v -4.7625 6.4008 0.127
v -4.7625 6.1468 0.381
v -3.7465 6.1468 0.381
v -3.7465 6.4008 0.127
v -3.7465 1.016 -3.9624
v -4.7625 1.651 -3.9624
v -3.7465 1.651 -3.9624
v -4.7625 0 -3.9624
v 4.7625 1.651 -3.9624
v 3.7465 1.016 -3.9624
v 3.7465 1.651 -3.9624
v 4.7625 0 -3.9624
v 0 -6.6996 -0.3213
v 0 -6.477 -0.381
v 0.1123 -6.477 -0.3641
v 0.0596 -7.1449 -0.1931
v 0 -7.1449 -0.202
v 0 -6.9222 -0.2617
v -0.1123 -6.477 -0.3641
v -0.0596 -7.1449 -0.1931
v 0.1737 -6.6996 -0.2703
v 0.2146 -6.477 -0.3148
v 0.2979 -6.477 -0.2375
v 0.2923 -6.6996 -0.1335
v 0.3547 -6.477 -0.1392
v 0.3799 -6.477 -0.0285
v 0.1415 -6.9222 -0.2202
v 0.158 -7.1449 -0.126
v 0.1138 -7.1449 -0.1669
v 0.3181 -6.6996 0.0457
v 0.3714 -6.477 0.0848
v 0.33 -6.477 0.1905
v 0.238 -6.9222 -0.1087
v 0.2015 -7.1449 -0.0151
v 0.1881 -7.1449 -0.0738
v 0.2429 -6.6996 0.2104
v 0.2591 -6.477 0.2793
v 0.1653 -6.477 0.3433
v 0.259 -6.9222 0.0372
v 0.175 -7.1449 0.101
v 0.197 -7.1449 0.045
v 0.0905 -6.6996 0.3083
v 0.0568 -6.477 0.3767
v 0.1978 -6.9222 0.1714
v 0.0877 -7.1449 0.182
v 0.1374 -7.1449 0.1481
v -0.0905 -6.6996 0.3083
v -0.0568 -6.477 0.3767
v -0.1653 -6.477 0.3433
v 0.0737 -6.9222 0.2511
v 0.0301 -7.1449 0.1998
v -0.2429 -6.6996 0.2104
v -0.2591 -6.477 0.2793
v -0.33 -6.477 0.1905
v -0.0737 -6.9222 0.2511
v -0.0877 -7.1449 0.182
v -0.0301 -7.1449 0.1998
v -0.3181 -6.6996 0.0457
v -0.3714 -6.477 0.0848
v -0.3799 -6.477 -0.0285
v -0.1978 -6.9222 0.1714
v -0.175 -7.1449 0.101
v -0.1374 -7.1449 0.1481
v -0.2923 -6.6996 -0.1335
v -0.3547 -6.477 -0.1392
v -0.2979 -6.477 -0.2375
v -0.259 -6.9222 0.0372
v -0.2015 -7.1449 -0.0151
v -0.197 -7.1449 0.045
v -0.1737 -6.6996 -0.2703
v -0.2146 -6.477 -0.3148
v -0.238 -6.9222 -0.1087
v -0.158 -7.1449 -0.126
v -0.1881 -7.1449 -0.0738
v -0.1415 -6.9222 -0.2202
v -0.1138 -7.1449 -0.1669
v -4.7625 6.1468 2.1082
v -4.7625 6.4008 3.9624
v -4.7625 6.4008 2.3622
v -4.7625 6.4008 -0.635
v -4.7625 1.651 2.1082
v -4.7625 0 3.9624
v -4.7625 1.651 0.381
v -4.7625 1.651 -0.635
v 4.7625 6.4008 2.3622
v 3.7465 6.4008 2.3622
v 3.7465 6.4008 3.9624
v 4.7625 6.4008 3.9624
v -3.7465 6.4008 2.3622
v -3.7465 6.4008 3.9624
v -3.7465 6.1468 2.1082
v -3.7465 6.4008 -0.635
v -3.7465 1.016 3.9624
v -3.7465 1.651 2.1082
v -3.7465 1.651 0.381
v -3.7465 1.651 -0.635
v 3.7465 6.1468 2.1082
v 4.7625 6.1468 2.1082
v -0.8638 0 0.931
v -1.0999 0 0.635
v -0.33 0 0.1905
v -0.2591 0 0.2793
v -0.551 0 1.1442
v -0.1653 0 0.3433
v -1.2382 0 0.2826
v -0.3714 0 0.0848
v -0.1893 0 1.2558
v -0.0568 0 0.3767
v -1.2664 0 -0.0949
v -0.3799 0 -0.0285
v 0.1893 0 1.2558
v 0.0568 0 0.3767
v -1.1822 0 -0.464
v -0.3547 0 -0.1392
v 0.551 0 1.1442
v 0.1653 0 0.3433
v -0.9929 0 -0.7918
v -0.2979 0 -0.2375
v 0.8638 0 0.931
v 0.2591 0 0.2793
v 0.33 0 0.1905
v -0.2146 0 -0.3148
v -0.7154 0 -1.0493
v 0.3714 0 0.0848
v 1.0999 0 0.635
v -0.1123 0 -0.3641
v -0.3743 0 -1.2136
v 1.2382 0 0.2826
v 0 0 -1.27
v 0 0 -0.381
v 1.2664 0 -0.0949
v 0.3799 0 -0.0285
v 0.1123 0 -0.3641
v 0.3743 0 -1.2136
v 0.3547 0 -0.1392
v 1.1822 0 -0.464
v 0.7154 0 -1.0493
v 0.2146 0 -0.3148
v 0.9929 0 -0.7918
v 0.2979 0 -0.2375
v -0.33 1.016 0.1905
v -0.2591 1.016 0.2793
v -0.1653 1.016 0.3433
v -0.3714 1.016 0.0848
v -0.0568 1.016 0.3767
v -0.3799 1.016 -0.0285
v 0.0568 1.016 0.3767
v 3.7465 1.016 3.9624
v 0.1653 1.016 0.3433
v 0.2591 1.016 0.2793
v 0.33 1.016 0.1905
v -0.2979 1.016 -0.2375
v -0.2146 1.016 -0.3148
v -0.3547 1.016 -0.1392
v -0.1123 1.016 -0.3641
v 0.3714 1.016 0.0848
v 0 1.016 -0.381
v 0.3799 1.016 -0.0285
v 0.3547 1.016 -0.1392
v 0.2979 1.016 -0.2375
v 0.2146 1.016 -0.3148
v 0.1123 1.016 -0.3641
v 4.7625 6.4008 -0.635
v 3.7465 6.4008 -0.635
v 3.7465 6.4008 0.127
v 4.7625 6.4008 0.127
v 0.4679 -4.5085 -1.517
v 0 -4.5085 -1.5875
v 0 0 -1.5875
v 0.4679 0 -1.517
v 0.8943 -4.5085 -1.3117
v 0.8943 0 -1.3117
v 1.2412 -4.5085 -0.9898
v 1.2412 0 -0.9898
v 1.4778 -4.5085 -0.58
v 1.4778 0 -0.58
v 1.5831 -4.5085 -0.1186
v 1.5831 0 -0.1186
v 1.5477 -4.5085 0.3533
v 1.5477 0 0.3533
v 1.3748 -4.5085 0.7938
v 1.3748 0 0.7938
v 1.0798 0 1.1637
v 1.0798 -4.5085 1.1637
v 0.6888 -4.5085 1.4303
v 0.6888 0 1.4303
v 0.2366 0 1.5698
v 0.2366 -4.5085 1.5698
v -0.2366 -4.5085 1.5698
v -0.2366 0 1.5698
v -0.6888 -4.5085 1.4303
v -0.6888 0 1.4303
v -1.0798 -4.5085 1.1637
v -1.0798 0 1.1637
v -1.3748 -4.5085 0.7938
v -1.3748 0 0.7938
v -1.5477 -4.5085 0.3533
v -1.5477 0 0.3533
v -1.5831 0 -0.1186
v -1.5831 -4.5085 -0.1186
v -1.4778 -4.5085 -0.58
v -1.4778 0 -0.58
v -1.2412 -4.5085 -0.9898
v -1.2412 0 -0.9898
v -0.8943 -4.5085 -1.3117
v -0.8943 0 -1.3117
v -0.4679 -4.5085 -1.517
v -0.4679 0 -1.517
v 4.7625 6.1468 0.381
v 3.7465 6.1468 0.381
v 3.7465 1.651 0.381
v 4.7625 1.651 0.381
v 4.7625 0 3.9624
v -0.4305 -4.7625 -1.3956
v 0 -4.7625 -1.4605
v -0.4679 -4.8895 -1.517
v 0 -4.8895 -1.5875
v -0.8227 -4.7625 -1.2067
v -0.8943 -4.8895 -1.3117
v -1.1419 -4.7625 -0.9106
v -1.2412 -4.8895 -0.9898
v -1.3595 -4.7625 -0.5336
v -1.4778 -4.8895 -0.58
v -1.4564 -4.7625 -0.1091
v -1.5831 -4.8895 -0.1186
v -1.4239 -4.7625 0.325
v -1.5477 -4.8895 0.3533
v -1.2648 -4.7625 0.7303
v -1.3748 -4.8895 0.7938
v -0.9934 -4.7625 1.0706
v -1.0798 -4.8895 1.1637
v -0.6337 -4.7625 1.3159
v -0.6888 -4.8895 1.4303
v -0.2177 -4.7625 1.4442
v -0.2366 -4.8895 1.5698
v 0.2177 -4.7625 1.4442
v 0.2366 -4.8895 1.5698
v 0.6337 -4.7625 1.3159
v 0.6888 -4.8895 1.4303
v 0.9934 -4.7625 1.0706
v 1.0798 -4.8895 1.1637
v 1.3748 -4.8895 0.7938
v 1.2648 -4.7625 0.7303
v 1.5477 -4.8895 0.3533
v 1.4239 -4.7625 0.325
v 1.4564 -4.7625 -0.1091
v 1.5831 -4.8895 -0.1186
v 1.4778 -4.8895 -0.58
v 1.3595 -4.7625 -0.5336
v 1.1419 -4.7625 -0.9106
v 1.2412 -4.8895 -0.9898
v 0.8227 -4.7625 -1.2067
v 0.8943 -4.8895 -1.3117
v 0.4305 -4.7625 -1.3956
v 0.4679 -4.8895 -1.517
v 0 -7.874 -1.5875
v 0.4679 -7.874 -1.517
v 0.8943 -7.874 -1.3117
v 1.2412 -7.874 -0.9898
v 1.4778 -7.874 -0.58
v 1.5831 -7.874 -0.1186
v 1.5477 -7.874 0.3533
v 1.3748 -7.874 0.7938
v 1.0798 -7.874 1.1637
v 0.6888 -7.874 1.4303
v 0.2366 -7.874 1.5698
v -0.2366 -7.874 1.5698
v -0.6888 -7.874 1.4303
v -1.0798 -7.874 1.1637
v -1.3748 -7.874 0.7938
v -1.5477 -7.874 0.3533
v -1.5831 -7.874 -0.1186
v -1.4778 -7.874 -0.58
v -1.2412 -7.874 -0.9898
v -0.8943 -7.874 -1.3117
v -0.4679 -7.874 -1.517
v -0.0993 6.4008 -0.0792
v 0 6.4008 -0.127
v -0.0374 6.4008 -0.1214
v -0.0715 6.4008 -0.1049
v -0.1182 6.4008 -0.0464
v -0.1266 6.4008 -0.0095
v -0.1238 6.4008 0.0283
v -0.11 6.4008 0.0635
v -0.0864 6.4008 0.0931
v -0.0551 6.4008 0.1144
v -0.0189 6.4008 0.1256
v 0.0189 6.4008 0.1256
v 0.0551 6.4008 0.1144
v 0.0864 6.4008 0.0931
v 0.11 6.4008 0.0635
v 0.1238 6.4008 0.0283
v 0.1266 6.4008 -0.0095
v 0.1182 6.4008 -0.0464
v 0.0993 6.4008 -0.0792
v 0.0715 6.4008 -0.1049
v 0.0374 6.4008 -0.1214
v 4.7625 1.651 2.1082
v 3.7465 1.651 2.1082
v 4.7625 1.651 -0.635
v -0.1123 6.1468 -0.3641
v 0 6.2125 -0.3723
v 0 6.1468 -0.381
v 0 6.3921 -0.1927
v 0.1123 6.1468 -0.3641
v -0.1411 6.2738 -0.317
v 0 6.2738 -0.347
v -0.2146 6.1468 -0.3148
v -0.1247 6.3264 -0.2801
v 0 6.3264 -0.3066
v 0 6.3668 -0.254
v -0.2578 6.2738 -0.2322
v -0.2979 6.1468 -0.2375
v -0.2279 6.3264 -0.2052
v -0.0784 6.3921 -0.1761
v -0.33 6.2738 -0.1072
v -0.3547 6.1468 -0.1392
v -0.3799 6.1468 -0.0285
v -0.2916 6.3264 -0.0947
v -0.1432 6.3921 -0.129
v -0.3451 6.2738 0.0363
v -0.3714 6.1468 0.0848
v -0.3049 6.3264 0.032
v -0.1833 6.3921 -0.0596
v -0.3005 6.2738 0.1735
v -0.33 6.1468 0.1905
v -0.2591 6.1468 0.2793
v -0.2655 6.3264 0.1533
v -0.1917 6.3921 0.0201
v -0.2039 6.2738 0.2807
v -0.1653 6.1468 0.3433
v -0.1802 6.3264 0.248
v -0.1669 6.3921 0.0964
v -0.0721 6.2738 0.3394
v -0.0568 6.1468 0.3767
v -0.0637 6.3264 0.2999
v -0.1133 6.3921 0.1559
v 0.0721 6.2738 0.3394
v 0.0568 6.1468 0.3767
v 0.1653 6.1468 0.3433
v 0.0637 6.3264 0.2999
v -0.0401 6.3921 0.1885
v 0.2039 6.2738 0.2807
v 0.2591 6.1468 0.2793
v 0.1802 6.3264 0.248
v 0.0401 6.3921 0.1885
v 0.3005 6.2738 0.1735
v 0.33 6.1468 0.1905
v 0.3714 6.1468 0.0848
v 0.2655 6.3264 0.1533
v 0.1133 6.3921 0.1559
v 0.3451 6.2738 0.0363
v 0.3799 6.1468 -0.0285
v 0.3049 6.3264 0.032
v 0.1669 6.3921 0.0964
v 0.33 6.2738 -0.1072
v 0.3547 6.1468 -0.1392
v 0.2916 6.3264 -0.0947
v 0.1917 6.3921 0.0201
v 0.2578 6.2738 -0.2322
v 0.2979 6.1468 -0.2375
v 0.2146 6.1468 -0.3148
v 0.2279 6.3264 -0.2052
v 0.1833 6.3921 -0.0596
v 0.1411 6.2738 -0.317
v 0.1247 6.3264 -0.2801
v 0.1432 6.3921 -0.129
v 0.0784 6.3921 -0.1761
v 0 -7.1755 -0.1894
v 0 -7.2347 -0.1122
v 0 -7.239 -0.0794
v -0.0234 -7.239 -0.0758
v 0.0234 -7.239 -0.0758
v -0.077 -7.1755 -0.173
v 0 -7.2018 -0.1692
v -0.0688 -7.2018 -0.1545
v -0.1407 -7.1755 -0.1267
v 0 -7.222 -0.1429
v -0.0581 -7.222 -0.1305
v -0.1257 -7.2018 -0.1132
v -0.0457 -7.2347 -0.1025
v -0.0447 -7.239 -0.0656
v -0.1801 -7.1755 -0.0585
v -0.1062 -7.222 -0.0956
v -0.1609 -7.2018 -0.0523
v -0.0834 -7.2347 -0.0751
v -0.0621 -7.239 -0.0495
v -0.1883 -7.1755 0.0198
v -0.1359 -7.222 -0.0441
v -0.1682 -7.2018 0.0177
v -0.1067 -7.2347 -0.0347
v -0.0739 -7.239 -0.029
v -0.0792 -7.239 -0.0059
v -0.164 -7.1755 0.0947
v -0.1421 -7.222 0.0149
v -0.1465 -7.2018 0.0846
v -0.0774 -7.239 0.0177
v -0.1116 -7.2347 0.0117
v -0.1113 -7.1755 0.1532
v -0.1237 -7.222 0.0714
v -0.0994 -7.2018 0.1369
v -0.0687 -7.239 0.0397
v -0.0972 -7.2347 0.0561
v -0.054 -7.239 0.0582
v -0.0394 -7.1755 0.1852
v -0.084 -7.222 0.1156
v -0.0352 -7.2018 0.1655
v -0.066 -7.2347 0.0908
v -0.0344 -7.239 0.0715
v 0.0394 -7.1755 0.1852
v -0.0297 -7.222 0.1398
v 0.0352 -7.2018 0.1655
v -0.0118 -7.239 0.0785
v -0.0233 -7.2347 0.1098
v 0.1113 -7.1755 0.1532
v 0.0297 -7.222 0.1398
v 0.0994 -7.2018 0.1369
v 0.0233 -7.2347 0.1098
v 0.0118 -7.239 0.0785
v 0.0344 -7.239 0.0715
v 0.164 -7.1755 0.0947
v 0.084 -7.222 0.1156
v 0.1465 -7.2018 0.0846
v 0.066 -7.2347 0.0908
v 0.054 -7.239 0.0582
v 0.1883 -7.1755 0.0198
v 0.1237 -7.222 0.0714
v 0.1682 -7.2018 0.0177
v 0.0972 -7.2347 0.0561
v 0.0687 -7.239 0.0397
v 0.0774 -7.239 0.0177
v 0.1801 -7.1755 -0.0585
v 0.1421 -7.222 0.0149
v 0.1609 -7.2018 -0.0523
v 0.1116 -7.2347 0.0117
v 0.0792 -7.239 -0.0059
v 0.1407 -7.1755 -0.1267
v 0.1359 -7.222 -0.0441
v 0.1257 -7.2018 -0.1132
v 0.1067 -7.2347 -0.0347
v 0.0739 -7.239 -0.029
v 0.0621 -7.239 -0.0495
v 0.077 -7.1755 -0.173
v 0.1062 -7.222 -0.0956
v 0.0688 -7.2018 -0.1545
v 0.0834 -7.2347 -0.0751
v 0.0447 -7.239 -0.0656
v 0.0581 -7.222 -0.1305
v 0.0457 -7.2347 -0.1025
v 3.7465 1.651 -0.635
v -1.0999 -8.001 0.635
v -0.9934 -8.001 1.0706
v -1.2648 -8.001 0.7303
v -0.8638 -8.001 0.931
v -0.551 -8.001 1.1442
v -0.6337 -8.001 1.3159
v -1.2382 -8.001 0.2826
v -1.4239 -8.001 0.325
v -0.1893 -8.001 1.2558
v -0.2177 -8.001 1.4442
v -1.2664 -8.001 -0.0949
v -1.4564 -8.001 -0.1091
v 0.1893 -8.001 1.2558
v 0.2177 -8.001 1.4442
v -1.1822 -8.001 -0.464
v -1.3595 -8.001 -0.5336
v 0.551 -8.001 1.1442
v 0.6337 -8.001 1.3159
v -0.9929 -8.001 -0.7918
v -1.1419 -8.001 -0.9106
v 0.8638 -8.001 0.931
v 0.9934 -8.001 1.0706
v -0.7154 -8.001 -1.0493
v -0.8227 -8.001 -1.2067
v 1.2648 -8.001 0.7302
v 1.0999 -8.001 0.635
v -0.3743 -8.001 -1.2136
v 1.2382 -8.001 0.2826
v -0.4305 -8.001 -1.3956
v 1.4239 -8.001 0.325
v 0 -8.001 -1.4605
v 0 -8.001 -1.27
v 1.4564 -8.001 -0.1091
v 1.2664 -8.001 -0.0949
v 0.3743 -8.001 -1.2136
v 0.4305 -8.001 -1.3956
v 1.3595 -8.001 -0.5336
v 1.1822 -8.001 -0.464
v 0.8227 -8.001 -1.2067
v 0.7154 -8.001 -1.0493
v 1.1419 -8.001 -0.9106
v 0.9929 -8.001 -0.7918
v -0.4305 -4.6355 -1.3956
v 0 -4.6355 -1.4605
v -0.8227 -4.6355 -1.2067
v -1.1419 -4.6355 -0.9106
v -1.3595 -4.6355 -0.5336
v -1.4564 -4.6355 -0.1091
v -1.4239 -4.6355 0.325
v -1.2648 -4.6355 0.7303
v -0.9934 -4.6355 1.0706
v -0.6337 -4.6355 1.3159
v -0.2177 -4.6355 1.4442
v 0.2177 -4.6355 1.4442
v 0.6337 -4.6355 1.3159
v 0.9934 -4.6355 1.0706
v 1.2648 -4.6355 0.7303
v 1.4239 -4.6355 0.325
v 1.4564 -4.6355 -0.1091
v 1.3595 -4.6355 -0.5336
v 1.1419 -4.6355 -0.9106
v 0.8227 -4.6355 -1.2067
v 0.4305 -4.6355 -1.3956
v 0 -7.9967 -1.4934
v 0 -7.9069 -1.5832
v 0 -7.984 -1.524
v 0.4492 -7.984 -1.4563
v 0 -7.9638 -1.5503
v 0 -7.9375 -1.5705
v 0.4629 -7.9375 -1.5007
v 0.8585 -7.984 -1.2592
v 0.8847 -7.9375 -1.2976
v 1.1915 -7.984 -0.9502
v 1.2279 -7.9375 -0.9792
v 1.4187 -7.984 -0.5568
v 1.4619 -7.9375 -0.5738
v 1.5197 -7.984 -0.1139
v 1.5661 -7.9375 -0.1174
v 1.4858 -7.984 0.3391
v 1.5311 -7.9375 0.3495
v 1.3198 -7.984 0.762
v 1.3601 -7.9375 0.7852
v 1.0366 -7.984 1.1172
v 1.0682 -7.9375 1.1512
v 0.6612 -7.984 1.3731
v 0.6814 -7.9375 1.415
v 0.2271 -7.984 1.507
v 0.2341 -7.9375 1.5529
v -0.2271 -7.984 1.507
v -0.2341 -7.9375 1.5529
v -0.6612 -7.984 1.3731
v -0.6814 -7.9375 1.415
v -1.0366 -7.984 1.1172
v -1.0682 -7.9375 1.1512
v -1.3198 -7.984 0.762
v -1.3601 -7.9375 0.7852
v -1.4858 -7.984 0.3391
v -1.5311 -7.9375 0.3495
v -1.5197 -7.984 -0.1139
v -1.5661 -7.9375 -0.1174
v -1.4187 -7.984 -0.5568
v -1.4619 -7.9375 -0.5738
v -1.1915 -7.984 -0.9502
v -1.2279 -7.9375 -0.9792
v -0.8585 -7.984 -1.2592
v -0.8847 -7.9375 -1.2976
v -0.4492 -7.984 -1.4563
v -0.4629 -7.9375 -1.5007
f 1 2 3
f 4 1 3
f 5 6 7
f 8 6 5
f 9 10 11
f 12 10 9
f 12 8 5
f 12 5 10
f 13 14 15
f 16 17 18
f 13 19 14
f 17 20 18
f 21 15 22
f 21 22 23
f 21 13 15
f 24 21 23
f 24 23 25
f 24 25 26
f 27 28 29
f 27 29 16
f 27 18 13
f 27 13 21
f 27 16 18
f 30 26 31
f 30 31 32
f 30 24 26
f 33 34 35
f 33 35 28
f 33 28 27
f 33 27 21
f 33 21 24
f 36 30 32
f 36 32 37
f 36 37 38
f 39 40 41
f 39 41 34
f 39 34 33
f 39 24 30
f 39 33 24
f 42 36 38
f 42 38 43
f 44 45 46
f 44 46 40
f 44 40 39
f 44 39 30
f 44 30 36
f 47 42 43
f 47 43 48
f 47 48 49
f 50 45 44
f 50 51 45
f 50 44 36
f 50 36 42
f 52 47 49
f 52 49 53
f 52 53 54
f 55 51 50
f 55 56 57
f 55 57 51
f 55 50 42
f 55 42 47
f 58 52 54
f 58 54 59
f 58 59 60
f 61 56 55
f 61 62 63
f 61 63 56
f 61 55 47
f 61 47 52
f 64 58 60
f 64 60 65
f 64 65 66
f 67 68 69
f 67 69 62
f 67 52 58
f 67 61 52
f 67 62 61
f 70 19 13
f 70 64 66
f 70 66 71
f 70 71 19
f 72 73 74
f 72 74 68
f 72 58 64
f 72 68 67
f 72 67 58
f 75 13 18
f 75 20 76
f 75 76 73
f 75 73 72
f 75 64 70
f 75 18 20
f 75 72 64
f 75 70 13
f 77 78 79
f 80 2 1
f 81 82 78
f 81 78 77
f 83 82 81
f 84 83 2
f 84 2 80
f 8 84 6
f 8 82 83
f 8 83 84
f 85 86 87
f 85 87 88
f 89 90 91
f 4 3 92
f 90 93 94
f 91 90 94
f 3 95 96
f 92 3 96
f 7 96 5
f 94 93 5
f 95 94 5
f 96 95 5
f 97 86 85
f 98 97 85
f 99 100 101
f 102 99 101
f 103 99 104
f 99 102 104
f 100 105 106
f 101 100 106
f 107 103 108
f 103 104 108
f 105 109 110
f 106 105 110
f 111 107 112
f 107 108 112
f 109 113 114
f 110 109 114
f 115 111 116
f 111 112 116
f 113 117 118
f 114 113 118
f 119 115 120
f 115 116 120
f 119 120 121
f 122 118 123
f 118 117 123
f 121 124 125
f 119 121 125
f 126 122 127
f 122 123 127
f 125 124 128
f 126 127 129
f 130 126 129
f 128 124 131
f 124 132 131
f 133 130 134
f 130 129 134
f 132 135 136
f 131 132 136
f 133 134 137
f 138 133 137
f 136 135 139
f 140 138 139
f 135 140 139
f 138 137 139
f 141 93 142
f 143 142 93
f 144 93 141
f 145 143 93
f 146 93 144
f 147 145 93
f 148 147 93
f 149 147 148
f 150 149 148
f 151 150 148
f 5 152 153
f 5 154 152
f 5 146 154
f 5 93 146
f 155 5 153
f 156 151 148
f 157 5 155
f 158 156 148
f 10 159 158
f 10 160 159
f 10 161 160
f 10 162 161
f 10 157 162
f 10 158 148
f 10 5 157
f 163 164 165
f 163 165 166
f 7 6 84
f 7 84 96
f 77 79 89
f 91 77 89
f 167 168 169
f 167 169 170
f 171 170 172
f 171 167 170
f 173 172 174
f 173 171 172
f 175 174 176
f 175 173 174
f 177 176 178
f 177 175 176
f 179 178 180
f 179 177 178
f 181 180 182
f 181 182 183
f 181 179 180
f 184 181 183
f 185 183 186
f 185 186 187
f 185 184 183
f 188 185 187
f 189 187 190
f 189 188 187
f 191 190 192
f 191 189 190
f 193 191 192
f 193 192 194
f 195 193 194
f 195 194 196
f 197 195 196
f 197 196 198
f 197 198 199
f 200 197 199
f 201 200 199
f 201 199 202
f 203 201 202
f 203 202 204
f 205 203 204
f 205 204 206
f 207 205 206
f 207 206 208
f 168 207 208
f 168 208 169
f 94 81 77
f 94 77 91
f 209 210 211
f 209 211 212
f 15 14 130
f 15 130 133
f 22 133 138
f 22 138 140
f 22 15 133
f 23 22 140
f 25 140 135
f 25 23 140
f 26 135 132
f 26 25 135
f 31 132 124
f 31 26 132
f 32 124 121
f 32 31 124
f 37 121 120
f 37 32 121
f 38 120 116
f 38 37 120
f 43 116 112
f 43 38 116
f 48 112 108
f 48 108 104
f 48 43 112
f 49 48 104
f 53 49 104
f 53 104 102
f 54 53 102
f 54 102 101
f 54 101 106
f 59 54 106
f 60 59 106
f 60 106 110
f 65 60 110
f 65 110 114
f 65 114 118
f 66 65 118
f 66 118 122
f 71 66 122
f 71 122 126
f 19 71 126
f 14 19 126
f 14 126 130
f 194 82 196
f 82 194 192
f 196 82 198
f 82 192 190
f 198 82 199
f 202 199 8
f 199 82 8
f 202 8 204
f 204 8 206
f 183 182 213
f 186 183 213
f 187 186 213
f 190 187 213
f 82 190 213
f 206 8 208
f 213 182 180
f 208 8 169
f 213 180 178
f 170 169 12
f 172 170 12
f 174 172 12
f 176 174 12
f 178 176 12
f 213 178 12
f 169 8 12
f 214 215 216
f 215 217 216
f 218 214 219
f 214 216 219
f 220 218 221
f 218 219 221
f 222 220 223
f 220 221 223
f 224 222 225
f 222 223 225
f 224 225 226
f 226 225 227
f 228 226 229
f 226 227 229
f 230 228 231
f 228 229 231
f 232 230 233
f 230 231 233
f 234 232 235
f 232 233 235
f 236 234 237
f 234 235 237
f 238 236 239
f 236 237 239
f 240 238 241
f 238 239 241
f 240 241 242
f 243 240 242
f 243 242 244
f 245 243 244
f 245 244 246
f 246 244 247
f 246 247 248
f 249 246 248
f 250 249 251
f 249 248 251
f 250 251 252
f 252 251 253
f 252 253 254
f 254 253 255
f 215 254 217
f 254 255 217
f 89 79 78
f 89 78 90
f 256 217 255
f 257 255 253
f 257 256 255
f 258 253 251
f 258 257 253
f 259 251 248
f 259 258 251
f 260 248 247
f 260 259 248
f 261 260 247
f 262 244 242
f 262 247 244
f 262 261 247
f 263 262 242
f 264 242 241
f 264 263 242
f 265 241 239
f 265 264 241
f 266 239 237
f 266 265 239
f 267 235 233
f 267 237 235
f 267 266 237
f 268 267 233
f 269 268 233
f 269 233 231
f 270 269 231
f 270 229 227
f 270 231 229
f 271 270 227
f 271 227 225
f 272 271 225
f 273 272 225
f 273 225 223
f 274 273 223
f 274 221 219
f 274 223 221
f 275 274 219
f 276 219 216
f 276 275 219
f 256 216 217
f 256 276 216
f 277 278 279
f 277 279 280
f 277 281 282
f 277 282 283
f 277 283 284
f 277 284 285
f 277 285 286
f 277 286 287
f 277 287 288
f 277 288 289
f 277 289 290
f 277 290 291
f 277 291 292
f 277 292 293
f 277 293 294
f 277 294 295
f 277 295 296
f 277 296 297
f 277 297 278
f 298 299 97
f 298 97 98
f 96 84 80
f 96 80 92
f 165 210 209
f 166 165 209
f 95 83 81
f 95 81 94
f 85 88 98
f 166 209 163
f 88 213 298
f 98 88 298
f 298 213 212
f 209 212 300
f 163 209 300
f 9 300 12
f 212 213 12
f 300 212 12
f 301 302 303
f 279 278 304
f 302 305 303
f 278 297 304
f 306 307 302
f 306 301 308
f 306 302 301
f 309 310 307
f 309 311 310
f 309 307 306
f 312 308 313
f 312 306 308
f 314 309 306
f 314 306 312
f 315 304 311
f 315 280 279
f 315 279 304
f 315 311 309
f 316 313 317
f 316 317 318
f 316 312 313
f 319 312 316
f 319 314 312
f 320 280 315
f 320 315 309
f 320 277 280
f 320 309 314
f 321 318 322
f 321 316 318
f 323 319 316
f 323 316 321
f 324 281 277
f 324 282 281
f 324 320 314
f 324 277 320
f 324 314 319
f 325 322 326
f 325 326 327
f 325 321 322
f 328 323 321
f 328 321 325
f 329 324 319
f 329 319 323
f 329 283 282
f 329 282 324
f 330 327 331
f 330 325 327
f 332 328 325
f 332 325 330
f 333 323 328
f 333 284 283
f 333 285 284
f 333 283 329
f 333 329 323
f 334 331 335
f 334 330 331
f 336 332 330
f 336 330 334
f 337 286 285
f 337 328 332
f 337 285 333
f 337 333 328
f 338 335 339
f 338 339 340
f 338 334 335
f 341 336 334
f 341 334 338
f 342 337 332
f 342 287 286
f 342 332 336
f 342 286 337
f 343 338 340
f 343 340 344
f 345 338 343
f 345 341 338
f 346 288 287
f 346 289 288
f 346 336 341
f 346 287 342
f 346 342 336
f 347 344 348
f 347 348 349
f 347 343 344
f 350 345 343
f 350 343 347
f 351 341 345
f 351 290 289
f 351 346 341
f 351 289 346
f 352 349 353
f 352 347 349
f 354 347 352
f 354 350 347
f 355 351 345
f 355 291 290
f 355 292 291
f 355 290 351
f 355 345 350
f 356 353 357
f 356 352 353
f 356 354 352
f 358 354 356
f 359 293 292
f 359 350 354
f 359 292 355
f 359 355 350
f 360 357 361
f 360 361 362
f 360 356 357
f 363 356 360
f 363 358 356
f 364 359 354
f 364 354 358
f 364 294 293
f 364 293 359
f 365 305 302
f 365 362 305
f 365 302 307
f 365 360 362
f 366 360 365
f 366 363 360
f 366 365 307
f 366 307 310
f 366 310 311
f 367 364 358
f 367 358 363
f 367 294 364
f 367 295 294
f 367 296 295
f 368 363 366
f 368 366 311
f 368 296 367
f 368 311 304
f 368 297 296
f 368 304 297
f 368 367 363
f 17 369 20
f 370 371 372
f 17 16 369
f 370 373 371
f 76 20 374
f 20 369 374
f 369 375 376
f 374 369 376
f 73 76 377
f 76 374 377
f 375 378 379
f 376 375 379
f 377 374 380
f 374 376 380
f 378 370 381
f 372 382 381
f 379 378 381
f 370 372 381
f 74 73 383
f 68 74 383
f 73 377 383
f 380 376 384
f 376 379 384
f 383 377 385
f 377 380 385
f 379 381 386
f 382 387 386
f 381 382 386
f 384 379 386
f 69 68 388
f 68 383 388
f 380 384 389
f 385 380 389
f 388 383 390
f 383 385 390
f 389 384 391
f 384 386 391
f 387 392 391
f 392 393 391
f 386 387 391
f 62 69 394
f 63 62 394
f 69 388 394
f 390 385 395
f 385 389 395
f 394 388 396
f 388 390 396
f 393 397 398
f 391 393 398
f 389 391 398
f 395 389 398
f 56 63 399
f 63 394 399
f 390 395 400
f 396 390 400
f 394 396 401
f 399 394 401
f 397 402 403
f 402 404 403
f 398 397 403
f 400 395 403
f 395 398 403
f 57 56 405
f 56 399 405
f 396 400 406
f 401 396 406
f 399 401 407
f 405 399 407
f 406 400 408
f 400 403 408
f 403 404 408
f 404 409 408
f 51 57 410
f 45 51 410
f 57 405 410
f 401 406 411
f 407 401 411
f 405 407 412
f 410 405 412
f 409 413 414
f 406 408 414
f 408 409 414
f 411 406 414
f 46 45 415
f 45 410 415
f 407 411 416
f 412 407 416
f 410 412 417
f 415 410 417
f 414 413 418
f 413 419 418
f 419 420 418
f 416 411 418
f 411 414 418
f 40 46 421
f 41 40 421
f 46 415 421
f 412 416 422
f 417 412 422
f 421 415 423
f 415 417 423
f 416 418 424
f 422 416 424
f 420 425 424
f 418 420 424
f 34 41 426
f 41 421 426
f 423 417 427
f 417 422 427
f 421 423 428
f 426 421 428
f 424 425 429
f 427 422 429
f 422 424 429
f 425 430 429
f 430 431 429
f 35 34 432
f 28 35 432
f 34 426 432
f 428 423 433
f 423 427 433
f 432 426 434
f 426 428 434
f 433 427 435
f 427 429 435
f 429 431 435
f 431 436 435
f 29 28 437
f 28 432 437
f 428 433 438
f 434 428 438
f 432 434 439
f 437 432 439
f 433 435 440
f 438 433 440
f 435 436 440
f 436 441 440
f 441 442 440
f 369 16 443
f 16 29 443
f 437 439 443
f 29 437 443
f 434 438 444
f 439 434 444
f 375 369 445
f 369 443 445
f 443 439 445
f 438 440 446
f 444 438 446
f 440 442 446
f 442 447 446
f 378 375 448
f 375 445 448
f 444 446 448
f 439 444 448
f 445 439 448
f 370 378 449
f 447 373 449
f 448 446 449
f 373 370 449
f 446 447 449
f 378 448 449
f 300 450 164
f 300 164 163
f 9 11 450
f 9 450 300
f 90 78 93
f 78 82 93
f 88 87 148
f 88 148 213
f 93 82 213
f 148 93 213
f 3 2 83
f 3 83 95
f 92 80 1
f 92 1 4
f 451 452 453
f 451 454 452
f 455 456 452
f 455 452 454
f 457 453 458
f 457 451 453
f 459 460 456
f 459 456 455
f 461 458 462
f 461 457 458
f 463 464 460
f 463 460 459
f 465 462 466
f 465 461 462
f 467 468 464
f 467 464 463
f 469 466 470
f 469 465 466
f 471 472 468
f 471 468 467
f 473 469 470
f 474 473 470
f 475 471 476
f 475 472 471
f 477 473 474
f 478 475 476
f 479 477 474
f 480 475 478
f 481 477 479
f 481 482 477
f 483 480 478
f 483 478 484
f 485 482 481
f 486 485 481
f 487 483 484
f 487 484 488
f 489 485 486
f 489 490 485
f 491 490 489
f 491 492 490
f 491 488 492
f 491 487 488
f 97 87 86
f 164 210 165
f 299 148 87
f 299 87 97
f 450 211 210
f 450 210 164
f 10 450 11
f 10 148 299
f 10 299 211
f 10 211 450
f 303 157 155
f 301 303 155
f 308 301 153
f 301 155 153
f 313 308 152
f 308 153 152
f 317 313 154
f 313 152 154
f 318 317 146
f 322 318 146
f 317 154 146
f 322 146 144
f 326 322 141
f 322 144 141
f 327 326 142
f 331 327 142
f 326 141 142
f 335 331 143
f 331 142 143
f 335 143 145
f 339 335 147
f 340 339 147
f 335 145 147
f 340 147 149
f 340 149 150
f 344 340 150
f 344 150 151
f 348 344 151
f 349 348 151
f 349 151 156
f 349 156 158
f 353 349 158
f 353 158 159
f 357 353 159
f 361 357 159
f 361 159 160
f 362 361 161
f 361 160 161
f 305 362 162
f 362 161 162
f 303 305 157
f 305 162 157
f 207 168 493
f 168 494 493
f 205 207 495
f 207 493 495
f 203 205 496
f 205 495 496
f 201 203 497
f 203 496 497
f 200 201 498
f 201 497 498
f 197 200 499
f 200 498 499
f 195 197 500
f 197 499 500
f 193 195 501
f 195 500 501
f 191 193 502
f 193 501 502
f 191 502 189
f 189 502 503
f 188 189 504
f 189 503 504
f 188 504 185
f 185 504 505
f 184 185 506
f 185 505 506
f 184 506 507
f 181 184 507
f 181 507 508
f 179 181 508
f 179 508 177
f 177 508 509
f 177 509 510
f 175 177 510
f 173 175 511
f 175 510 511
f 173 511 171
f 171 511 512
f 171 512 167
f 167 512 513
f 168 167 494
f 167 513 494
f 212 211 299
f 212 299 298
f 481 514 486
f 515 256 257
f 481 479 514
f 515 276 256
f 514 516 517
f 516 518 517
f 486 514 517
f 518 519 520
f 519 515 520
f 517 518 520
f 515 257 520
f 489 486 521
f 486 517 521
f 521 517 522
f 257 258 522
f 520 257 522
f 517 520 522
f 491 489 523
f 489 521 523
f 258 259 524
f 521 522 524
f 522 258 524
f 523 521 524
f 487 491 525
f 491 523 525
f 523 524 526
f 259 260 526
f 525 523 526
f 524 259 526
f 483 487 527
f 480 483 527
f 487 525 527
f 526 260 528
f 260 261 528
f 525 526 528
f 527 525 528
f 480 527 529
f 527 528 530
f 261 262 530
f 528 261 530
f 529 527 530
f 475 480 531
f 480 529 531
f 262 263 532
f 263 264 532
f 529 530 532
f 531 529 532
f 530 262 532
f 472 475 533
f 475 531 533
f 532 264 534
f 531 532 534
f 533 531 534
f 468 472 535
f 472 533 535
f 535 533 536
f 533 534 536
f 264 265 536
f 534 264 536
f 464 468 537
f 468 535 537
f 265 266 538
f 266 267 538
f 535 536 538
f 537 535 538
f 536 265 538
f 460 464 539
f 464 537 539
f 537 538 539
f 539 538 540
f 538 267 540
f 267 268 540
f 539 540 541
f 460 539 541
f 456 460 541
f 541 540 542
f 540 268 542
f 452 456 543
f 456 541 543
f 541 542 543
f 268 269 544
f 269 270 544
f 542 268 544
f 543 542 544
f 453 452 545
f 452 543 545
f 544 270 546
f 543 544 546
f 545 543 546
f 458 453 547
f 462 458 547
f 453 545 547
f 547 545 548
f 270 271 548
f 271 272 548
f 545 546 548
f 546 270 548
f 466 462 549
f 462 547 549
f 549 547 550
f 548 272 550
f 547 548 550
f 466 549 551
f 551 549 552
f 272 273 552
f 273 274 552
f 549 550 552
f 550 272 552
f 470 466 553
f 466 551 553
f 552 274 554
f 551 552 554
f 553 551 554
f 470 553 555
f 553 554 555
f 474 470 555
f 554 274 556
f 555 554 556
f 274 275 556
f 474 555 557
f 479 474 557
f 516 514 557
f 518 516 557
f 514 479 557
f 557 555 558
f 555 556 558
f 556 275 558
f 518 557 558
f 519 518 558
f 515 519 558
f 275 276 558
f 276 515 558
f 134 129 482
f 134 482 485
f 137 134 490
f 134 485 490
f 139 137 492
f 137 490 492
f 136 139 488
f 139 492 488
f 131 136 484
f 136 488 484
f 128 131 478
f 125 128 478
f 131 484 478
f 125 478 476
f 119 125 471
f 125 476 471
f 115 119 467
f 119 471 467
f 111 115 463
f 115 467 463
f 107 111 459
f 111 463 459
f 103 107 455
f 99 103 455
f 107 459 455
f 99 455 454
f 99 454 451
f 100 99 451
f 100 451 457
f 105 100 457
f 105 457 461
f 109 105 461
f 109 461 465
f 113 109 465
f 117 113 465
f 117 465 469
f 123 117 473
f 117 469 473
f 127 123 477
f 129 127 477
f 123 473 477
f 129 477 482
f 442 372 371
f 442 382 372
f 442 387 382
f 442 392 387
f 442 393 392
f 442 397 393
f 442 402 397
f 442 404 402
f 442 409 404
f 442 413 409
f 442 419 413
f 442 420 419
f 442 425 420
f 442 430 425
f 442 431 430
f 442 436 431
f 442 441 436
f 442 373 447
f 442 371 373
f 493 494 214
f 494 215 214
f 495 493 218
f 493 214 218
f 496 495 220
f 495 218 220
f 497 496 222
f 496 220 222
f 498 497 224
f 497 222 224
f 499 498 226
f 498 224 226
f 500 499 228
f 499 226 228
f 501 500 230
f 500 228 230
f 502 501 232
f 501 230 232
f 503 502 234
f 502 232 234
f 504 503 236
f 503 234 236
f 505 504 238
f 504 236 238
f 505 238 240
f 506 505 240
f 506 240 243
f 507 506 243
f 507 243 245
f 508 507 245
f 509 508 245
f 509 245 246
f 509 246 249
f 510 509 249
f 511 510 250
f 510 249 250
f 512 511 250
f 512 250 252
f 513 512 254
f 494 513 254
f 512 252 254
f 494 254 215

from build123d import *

# Parameters (mm, degrees)
SKETCH1_W           = 9.525
SKETCH1_H           = 7.9248
BOSS_EXTRUDE1_DEPTH = 1.016
SKETCH2_W           = 1.016
SKETCH2_H           = 7.9248
BOSS_EXTRUDE2_DEPTH = 0.635
SKETCH3_W           = 1.016
SKETCH3_H           = 1.8542
SKETCH3_H_2         = 1.016
BOSS_EXTRUDE3_DEPTH = 4.7498
CHAMFER1_SIZE       = 0.254
SKETCH4_R           = 0.381
BOSS_EXTRUDE4_DEPTH = 5.3848
FILLET1_R           = 0.254
BOSS_EXTRUDE5_START = 8.001
SKETCH5_R           = 1.5875
SKETCH5_R_2         = 1.27
SKETCH5_R_3         = 0.381
BOSS_EXTRUDE5_DEPTH = 8.001
SKETCH7_R           = 0.381
CUT_EXTRUDE1_DEPTH  = 1.524
SKETCH8_R           = 0.381
BOSS_EXTRUDE6_DEPTH = 0.762
BOSS_EXTRUDE6_TAPER = 15
FILLET2_R           = 0.127
FILLET3_R           = 0.127


with BuildPart() as part:
    # Sketch1 → Boss-Extrude1 (new body)
    with BuildSketch(Plane(origin=(0, 0, 0), x_dir=(1, 0, 0), z_dir=(0, 1, 0))):
        Rectangle(SKETCH1_W, SKETCH1_H)
    extrude(amount=BOSS_EXTRUDE1_DEPTH)

    # Sketch2 → Boss-Extrude2 (add)
    with BuildSketch(Plane(origin=(0, 1.016, 0), x_dir=(1, 0, 0), z_dir=(0, 1, 0))):
        with Locations((-4.2545, 0)):
            Rectangle(SKETCH2_W, SKETCH2_H)
        with Locations((4.2545, 0)):
            Rectangle(SKETCH2_W, SKETCH2_H)
    extrude(amount=BOSS_EXTRUDE2_DEPTH)

    # Sketch3 → Boss-Extrude3 (add)
    with BuildSketch(Plane(origin=(0, 1.651, 0), x_dir=(1, 0, 0), z_dir=(0, 1, 0))):
        with Locations((-4.2545, -3.0353)):
            Rectangle(SKETCH3_W, SKETCH3_H)
        with Locations((-4.2545, 0.127)):
            Rectangle(SKETCH3_W, SKETCH3_H_2)
        with Locations((4.2545, 0.127)):
            Rectangle(SKETCH3_W, SKETCH3_H_2)
        with Locations((4.2545, -3.0353)):
            Rectangle(SKETCH3_W, SKETCH3_H)
    extrude(amount=BOSS_EXTRUDE3_DEPTH)

    # Chamfer1
    chamfer1_edges = [part.edges().sort_by_distance(p)[0] for p in [
        (-4.2545, 6.4008, 2.1082),
        (-4.2545, 6.4008, 0.381),
        (4.2545, 6.4008, 0.381),
        (4.2545, 6.4008, 2.1082),
    ]]
    chamfer(chamfer1_edges, length=CHAMFER1_SIZE)

    # Sketch4 → Boss-Extrude4 (add)
    with BuildSketch(Plane(origin=(0, 1.016, 0), x_dir=(1, 0, 0), z_dir=(0, 1, 0))):
        with Locations(Location((0, 0, 0), (0, 0, 90))):
            Circle(SKETCH4_R)
    extrude(amount=BOSS_EXTRUDE4_DEPTH)

    # Fillet1
    fillet1_edges = [part.edges().sort_by_distance(p)[0] for p in [
        (0, 6.4008, 0.381),
    ]]
    fillet(fillet1_edges, radius=FILLET1_R)

    # Sketch5 → Boss-Extrude5 (add)
    # profile 1 of 2: a face of its own
    with BuildSketch(Plane.XZ.offset(BOSS_EXTRUDE5_START)):
        with Locations(Location((0, 0, 0), (0, 0, 270))):
            Circle(SKETCH5_R)
        with Locations(Location((0, 0, 0), (0, 0, 270))):
            Circle(SKETCH5_R_2, mode=Mode.SUBTRACT)
    # profile 2 of 2: a face of its own
    with BuildSketch(Plane.XZ.offset(BOSS_EXTRUDE5_START)):
        with Locations(Location((0, 0, 0), (0, 0, 270))):
            Circle(SKETCH5_R_3)
    extrude(amount=-BOSS_EXTRUDE5_DEPTH)

    # Sketch6 → Cut-Revolve1 (revolve, cut)
    with BuildSketch(Plane(origin=(0, 0, 0), x_dir=(0, 0, -1), z_dir=(1, 0, 0))):
        Polygon((1.5875, -4.5085), (1.4605, -4.6355), (1.4605, -4.7625), (1.5875, -4.8895), align=None)
    revolve(axis=Axis((0, -8.001, 0), (0, 1, 0)), mode=Mode.SUBTRACT)

    # Sketch7 → Cut-Extrude1 (cut)
    with BuildSketch(Plane.XZ.offset(8.001)):
        with Locations(Location((0, 0, 0), (0, 0, 270))):
            Circle(SKETCH7_R)
    extrude(amount=-CUT_EXTRUDE1_DEPTH, mode=Mode.SUBTRACT)

    # Sketch8 → Boss-Extrude6 (add)
    with BuildSketch(Plane.XZ.offset(6.477)):
        with Locations(Location((0, 0, 0), (0, 0, 270))):
            Circle(SKETCH8_R)
    extrude(amount=BOSS_EXTRUDE6_DEPTH, taper=BOSS_EXTRUDE6_TAPER)

    # Fillet2
    fillet2_edges = [part.edges().sort_by_distance(p)[0] for p in [
        (0, -7.239, 0.176822715),
    ]]
    fillet(fillet2_edges, radius=FILLET2_R)

    # Fillet3
    fillet3_edges = [part.edges().sort_by_distance(p)[0] for p in [
        (0, -8.001, 1.5875),
    ]]
    fillet(fillet3_edges, radius=FILLET3_R)


solid = part.part
